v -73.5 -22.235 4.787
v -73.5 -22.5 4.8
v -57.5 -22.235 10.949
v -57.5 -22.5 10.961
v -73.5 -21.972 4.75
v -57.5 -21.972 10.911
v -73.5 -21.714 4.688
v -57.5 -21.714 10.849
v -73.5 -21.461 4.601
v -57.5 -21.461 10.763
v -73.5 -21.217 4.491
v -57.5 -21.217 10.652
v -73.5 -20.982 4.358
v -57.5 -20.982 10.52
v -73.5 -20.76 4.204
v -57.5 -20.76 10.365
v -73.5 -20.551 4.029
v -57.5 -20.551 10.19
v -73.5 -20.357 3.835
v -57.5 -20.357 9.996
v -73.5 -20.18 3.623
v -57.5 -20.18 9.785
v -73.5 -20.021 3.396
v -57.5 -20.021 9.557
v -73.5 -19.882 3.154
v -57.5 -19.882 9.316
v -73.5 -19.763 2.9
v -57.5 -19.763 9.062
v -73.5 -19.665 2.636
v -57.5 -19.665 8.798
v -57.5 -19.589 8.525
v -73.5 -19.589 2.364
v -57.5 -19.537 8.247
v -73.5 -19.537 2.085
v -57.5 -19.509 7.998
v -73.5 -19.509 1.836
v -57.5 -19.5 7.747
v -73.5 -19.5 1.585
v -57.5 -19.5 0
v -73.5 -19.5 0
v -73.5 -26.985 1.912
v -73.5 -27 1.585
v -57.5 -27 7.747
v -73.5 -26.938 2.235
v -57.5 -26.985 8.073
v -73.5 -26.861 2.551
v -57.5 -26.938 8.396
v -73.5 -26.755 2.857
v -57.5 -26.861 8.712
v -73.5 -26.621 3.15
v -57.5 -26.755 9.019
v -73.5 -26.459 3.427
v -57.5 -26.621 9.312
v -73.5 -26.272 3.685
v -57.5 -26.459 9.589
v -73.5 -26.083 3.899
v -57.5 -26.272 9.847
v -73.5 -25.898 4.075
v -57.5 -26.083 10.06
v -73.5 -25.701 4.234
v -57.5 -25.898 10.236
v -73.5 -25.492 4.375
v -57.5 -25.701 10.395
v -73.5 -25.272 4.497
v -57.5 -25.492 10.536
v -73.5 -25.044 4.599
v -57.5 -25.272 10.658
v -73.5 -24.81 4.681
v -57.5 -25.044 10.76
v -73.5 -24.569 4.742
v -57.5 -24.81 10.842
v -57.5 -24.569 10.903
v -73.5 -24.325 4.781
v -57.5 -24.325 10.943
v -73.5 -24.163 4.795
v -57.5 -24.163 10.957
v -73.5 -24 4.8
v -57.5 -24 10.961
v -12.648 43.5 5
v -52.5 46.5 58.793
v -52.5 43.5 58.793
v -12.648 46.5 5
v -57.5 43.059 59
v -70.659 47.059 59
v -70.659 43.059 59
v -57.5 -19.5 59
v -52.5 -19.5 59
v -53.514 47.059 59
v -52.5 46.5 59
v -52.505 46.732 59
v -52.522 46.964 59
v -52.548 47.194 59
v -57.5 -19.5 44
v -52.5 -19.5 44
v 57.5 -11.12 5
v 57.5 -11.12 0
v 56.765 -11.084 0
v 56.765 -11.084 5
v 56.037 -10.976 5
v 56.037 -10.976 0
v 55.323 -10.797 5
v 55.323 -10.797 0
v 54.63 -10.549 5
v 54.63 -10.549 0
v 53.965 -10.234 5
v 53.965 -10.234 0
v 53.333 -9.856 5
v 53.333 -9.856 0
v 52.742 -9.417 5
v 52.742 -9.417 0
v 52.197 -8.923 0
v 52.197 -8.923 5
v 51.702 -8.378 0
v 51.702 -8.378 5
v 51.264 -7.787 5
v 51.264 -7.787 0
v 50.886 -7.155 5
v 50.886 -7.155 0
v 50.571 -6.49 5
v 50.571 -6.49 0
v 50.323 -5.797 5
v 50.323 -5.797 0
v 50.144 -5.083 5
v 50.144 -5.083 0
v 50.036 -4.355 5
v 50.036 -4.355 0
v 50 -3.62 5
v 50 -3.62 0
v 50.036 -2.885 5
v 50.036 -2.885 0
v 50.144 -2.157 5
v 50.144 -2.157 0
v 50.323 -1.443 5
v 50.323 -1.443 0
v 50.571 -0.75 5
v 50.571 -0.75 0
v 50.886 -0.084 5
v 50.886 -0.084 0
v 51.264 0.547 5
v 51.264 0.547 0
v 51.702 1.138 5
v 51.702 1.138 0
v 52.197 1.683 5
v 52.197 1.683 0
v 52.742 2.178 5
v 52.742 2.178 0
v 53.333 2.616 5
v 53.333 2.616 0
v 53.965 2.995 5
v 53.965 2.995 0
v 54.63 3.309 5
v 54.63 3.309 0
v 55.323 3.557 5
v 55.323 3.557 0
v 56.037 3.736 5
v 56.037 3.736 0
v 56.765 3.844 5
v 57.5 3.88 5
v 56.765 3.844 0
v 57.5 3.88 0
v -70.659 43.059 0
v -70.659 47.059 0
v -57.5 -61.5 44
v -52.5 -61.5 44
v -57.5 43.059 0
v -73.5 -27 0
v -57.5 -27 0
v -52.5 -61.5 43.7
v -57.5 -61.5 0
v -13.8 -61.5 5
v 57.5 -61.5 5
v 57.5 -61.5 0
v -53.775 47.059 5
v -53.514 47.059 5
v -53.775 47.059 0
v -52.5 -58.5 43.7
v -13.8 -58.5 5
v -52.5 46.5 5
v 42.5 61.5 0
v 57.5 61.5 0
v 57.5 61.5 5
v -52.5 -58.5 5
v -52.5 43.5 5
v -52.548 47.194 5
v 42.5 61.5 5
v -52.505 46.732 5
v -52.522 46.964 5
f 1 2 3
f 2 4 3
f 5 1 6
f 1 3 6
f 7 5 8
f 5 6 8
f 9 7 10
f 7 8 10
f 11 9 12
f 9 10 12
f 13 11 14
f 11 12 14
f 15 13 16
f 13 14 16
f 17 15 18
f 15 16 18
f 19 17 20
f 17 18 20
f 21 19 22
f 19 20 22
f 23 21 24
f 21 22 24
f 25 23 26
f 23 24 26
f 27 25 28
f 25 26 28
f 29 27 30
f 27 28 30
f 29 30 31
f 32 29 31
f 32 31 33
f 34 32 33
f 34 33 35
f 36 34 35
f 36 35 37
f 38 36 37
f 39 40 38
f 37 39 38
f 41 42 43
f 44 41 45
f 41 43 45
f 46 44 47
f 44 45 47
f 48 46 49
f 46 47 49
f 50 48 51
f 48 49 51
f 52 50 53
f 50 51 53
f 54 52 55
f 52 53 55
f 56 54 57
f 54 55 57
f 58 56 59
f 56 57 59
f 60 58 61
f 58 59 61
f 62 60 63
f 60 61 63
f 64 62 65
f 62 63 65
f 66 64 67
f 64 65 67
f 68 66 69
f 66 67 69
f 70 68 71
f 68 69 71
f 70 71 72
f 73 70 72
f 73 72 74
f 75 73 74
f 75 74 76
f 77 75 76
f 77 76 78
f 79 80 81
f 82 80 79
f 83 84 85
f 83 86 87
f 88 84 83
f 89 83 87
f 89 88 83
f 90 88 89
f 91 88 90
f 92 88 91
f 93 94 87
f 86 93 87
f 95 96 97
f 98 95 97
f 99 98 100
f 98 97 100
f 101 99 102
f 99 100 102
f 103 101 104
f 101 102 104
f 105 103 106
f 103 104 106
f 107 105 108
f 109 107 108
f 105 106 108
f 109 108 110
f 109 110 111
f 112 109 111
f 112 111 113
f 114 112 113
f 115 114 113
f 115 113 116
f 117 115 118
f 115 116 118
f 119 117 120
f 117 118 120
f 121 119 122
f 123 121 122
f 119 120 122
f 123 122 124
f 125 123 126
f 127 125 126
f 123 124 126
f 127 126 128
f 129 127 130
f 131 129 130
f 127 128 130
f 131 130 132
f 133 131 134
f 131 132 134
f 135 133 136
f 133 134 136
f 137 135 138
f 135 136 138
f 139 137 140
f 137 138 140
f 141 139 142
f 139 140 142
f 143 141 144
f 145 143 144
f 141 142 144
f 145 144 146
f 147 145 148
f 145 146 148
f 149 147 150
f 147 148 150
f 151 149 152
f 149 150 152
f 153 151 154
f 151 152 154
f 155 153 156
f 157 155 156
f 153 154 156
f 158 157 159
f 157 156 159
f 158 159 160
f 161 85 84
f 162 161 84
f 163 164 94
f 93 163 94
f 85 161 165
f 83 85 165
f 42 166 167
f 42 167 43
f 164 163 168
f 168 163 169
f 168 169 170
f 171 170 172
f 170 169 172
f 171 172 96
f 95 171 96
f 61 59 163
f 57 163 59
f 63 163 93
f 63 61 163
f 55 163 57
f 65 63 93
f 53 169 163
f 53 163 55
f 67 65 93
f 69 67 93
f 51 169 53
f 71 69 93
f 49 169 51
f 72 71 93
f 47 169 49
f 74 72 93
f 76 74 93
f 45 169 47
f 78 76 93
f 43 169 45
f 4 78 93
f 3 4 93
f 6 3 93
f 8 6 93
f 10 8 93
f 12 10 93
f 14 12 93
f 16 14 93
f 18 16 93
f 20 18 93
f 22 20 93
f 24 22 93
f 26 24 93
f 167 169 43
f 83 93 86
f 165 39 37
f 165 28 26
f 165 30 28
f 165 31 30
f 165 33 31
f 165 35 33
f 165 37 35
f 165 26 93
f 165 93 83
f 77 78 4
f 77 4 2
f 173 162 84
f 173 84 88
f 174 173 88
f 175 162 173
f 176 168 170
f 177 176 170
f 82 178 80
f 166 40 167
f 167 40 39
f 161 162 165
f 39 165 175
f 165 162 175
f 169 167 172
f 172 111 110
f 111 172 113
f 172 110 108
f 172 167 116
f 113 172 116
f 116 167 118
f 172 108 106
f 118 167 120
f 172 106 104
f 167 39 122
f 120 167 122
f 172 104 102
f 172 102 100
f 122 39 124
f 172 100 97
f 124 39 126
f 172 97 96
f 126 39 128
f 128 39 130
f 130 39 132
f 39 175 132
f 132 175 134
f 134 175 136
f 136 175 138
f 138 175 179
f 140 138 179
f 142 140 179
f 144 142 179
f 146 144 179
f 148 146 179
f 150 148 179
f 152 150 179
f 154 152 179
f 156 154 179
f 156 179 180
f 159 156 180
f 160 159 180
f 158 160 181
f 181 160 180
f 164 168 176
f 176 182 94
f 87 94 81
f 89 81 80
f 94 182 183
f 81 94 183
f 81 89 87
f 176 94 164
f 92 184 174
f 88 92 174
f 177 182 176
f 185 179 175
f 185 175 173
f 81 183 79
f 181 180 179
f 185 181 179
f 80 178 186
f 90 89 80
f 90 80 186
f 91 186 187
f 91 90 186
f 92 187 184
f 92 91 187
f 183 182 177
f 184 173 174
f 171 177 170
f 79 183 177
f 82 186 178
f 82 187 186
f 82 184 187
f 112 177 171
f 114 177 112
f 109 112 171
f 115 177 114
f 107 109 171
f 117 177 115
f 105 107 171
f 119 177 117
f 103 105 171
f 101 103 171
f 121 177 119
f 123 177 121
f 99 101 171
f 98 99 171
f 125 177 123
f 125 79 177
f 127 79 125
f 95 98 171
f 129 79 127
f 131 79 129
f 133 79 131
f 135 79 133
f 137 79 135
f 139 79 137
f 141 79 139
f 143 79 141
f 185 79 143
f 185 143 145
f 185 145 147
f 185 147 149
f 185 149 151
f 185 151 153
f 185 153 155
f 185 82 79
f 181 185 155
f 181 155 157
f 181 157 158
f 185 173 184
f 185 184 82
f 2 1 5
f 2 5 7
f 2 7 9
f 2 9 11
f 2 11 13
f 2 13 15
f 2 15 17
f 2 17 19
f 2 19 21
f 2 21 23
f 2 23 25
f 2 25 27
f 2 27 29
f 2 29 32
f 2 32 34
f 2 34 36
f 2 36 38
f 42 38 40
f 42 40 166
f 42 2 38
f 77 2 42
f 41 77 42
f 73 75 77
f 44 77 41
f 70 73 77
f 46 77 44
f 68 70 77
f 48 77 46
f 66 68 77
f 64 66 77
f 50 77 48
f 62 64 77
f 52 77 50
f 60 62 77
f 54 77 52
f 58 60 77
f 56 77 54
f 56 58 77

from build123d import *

# Parameters (mm, degrees)
F1_DEPTH     = 5
F2_SIZE2     = 100
F2_SIZE      = 15
F3_W         = 5
F3_H         = 108
F4_DEPTH     = 54
F4_FACE_W    = 5
F4_FACE_H    = 54
F5_ANGLE     = 7.9800839779
F6_W         = 42
F6_H         = 15
F7_DEPTH     = 25
F8_W         = 7.5
F8_H         = 11
F9_DEPTH     = 16
F10_T4_DEPTH = 91.0129088322
F11_R        = 3
F12_W        = 18
F12_H        = 4
F13_DEPTH    = 59
F14_W        = 40
F14_H        = 3
F15_DEPTH    = 38.7
F16_DEPTH    = 15.2
F17_T1_DEPTH = 208.7346390373
F17_T6_DEPTH = 207.8673195186
F18_T4_DEPTH = 299.280483699


# Not quite as in the source:
# - a fillet or chamfer that OpenCascade refuses, or shapes differently, is made with other operations: its cross-section is extruded or revolved along the edge and cut away or added


with BuildPart() as f1:
    # F0 (on Top) → F1 (new body)
    with BuildSketch(Plane.XY):
        with BuildLine():
            Line((57.5, 3.8800953701), (57.5, 61.5))
            Line((57.5, 61.5), (-57.5, 61.5))
            Line((-57.5, 61.5), (-57.5, -61.5))
            Line((-57.5, -61.5), (57.5, -61.5))
            Line((57.5, -61.5), (57.5, -11.1199046299))
            ThreePointArc((57.5, -11.1199046299), (50, -3.6199046299), (57.5, 3.8800953701))
        make_face()
    extrude(amount=F1_DEPTH)

    # F2
    f2_edges = [f1.edges().sort_by_distance(p)[0] for p in [
        (-57.5, 61.5, 2.5),
    ]]
    f2_side = f1.faces().sort_by_distance((-57.5, 0, 2.5))[0]
    chamfer(f2_edges, length=F2_SIZE, length2=F2_SIZE2, reference=f2_side)

    # F3 (on face) → F4 (join)
    with BuildSketch(Plane.XY.offset(5)):
        with Locations((-55, -7.5)):
            Rectangle(F3_W, F3_H)
    extrude(amount=F4_DEPTH)

    # F4_face (on face) → F5 (revolve)
    with BuildSketch(Plane(origin=(-55, 46.5, 32), x_dir=(-1, 0, 0), z_dir=(0, 1, 0))):
        Rectangle(F4_FACE_W, F4_FACE_H)
    revolve(axis=Axis((-57.5, 46.5, 32), (0, 0, 1)), revolution_arc=F5_ANGLE)

    # F6 (on face) → F7 (cut)
    with BuildSketch(Plane.YZ.offset(-52.5)):
        with Locations((-40.5, 51.5)):
            Rectangle(F6_W, F6_H)
    extrude(amount=-F7_DEPTH, mode=Mode.SUBTRACT)

    # F8 (on face) → F9 (join)
    with BuildSketch(Plane(origin=(-57.5, 0, 0), x_dir=(0, -1, 0), z_dir=(-1, 0, 0))):
        with Locations((23.25, 5.5)):
            Rectangle(F8_W, F8_H)
    extrude(amount=F9_DEPTH)

    # F10: chamfer of 16.1 x 6.2 on 1 edges, made by hand


with BuildPart() as f10_tool2:
    # F10_s3 → F10_t4 (new body)
    with BuildSketch(Plane.XZ.offset(68.7564544161)):
        Polygon((-57.4, 11), (-73.5, 4.8), (-73.5, 11), align=None)
    extrude(amount=-F10_T4_DEPTH)

    split(bisect_by=Plane.YZ.offset(-57.5), keep=Keep.BOTTOM)


with BuildPart() as f1_1:
    add(f1.part)

    # F10_t1: cut F10_tool2
    add(f10_tool2.part, mode=Mode.SUBTRACT)

    # F11
    f11_edges = [f1_1.edges().sort_by_distance(p)[0] for p in [
        (-65.5, -27, 7.880745),
        (-65.5, -19.5, 7.880745),
    ]]
    fillet(f11_edges, radius=F11_R)

    # F12 (on Top) → F13 (join)
    with BuildSketch(Plane.XY):
        with Locations((-61.6593700051, 45.0587611198)):
            Rectangle(F12_W, F12_H)
    extrude(amount=F13_DEPTH)

    # F14 (on face) → F15 (join)
    with BuildSketch(Plane.XY.offset(5)):
        with Locations((-32.5, -60)):
            Rectangle(F14_W, F14_H)
        with Locations((-32.5, 45)):
            Rectangle(F14_W, F14_H)
    extrude(amount=F15_DEPTH)

    # F16 (add): a face of the model
    f16_faces = [f1_1.faces().sort_by_distance(p)[0] for p in [
        (-32.5, 45, 43.7),
    ]]
    extrude(f16_faces, amount=F16_DEPTH)

    # F17: chamfer of 40 on 2 edges, made by hand

    # F17_s2 → F17_t1 (cut)
    with BuildSketch(Plane.XZ.offset(-149.3673195186)):
        Polygon((-52.5, 58.9), (-12.5, 18.9), (-12.5, 58.9), align=None)
    extrude(amount=F17_T1_DEPTH, mode=Mode.SUBTRACT)


with BuildPart() as f17_tool4:
    # F17_s5 → F17_t6 (new body)
    with BuildSketch(Plane.XZ.offset(164.3673195186)):
        Polygon((-52.5, 43.7), (-12.5, 3.7), (-12.5, 43.7), align=None)
    extrude(amount=-F17_T6_DEPTH)

    split(bisect_by=Plane.XY.offset(5), keep=Keep.TOP)


with BuildPart() as f1_2:
    add(f1_1.part)

    # F17_t3: cut F17_tool4
    add(f17_tool4.part, mode=Mode.SUBTRACT)

    # F18: chamfer of 14.1 x 57 on 1 edges, made by hand


with BuildPart() as f18_tool2:
    # F18_s3 → F18_t4 (new body)
    with BuildSketch(Plane.XZ.offset(-194.6402418495)):
        Polygon((-52.8050865276, 59.2050865276), (-12.5, 4.8), (-12.5, 18.9), align=None)
    extrude(amount=F18_T4_DEPTH)

    split(bisect_by=Plane.XY.offset(5), keep=Keep.TOP)

    split(bisect_by=Plane.YZ.offset(-52.5), keep=Keep.TOP)


with BuildPart() as f1_3:
    add(f1_2.part)

    # F18_t1: cut F18_tool2
    add(f18_tool2.part, mode=Mode.SUBTRACT)


solid = f1_3.part
